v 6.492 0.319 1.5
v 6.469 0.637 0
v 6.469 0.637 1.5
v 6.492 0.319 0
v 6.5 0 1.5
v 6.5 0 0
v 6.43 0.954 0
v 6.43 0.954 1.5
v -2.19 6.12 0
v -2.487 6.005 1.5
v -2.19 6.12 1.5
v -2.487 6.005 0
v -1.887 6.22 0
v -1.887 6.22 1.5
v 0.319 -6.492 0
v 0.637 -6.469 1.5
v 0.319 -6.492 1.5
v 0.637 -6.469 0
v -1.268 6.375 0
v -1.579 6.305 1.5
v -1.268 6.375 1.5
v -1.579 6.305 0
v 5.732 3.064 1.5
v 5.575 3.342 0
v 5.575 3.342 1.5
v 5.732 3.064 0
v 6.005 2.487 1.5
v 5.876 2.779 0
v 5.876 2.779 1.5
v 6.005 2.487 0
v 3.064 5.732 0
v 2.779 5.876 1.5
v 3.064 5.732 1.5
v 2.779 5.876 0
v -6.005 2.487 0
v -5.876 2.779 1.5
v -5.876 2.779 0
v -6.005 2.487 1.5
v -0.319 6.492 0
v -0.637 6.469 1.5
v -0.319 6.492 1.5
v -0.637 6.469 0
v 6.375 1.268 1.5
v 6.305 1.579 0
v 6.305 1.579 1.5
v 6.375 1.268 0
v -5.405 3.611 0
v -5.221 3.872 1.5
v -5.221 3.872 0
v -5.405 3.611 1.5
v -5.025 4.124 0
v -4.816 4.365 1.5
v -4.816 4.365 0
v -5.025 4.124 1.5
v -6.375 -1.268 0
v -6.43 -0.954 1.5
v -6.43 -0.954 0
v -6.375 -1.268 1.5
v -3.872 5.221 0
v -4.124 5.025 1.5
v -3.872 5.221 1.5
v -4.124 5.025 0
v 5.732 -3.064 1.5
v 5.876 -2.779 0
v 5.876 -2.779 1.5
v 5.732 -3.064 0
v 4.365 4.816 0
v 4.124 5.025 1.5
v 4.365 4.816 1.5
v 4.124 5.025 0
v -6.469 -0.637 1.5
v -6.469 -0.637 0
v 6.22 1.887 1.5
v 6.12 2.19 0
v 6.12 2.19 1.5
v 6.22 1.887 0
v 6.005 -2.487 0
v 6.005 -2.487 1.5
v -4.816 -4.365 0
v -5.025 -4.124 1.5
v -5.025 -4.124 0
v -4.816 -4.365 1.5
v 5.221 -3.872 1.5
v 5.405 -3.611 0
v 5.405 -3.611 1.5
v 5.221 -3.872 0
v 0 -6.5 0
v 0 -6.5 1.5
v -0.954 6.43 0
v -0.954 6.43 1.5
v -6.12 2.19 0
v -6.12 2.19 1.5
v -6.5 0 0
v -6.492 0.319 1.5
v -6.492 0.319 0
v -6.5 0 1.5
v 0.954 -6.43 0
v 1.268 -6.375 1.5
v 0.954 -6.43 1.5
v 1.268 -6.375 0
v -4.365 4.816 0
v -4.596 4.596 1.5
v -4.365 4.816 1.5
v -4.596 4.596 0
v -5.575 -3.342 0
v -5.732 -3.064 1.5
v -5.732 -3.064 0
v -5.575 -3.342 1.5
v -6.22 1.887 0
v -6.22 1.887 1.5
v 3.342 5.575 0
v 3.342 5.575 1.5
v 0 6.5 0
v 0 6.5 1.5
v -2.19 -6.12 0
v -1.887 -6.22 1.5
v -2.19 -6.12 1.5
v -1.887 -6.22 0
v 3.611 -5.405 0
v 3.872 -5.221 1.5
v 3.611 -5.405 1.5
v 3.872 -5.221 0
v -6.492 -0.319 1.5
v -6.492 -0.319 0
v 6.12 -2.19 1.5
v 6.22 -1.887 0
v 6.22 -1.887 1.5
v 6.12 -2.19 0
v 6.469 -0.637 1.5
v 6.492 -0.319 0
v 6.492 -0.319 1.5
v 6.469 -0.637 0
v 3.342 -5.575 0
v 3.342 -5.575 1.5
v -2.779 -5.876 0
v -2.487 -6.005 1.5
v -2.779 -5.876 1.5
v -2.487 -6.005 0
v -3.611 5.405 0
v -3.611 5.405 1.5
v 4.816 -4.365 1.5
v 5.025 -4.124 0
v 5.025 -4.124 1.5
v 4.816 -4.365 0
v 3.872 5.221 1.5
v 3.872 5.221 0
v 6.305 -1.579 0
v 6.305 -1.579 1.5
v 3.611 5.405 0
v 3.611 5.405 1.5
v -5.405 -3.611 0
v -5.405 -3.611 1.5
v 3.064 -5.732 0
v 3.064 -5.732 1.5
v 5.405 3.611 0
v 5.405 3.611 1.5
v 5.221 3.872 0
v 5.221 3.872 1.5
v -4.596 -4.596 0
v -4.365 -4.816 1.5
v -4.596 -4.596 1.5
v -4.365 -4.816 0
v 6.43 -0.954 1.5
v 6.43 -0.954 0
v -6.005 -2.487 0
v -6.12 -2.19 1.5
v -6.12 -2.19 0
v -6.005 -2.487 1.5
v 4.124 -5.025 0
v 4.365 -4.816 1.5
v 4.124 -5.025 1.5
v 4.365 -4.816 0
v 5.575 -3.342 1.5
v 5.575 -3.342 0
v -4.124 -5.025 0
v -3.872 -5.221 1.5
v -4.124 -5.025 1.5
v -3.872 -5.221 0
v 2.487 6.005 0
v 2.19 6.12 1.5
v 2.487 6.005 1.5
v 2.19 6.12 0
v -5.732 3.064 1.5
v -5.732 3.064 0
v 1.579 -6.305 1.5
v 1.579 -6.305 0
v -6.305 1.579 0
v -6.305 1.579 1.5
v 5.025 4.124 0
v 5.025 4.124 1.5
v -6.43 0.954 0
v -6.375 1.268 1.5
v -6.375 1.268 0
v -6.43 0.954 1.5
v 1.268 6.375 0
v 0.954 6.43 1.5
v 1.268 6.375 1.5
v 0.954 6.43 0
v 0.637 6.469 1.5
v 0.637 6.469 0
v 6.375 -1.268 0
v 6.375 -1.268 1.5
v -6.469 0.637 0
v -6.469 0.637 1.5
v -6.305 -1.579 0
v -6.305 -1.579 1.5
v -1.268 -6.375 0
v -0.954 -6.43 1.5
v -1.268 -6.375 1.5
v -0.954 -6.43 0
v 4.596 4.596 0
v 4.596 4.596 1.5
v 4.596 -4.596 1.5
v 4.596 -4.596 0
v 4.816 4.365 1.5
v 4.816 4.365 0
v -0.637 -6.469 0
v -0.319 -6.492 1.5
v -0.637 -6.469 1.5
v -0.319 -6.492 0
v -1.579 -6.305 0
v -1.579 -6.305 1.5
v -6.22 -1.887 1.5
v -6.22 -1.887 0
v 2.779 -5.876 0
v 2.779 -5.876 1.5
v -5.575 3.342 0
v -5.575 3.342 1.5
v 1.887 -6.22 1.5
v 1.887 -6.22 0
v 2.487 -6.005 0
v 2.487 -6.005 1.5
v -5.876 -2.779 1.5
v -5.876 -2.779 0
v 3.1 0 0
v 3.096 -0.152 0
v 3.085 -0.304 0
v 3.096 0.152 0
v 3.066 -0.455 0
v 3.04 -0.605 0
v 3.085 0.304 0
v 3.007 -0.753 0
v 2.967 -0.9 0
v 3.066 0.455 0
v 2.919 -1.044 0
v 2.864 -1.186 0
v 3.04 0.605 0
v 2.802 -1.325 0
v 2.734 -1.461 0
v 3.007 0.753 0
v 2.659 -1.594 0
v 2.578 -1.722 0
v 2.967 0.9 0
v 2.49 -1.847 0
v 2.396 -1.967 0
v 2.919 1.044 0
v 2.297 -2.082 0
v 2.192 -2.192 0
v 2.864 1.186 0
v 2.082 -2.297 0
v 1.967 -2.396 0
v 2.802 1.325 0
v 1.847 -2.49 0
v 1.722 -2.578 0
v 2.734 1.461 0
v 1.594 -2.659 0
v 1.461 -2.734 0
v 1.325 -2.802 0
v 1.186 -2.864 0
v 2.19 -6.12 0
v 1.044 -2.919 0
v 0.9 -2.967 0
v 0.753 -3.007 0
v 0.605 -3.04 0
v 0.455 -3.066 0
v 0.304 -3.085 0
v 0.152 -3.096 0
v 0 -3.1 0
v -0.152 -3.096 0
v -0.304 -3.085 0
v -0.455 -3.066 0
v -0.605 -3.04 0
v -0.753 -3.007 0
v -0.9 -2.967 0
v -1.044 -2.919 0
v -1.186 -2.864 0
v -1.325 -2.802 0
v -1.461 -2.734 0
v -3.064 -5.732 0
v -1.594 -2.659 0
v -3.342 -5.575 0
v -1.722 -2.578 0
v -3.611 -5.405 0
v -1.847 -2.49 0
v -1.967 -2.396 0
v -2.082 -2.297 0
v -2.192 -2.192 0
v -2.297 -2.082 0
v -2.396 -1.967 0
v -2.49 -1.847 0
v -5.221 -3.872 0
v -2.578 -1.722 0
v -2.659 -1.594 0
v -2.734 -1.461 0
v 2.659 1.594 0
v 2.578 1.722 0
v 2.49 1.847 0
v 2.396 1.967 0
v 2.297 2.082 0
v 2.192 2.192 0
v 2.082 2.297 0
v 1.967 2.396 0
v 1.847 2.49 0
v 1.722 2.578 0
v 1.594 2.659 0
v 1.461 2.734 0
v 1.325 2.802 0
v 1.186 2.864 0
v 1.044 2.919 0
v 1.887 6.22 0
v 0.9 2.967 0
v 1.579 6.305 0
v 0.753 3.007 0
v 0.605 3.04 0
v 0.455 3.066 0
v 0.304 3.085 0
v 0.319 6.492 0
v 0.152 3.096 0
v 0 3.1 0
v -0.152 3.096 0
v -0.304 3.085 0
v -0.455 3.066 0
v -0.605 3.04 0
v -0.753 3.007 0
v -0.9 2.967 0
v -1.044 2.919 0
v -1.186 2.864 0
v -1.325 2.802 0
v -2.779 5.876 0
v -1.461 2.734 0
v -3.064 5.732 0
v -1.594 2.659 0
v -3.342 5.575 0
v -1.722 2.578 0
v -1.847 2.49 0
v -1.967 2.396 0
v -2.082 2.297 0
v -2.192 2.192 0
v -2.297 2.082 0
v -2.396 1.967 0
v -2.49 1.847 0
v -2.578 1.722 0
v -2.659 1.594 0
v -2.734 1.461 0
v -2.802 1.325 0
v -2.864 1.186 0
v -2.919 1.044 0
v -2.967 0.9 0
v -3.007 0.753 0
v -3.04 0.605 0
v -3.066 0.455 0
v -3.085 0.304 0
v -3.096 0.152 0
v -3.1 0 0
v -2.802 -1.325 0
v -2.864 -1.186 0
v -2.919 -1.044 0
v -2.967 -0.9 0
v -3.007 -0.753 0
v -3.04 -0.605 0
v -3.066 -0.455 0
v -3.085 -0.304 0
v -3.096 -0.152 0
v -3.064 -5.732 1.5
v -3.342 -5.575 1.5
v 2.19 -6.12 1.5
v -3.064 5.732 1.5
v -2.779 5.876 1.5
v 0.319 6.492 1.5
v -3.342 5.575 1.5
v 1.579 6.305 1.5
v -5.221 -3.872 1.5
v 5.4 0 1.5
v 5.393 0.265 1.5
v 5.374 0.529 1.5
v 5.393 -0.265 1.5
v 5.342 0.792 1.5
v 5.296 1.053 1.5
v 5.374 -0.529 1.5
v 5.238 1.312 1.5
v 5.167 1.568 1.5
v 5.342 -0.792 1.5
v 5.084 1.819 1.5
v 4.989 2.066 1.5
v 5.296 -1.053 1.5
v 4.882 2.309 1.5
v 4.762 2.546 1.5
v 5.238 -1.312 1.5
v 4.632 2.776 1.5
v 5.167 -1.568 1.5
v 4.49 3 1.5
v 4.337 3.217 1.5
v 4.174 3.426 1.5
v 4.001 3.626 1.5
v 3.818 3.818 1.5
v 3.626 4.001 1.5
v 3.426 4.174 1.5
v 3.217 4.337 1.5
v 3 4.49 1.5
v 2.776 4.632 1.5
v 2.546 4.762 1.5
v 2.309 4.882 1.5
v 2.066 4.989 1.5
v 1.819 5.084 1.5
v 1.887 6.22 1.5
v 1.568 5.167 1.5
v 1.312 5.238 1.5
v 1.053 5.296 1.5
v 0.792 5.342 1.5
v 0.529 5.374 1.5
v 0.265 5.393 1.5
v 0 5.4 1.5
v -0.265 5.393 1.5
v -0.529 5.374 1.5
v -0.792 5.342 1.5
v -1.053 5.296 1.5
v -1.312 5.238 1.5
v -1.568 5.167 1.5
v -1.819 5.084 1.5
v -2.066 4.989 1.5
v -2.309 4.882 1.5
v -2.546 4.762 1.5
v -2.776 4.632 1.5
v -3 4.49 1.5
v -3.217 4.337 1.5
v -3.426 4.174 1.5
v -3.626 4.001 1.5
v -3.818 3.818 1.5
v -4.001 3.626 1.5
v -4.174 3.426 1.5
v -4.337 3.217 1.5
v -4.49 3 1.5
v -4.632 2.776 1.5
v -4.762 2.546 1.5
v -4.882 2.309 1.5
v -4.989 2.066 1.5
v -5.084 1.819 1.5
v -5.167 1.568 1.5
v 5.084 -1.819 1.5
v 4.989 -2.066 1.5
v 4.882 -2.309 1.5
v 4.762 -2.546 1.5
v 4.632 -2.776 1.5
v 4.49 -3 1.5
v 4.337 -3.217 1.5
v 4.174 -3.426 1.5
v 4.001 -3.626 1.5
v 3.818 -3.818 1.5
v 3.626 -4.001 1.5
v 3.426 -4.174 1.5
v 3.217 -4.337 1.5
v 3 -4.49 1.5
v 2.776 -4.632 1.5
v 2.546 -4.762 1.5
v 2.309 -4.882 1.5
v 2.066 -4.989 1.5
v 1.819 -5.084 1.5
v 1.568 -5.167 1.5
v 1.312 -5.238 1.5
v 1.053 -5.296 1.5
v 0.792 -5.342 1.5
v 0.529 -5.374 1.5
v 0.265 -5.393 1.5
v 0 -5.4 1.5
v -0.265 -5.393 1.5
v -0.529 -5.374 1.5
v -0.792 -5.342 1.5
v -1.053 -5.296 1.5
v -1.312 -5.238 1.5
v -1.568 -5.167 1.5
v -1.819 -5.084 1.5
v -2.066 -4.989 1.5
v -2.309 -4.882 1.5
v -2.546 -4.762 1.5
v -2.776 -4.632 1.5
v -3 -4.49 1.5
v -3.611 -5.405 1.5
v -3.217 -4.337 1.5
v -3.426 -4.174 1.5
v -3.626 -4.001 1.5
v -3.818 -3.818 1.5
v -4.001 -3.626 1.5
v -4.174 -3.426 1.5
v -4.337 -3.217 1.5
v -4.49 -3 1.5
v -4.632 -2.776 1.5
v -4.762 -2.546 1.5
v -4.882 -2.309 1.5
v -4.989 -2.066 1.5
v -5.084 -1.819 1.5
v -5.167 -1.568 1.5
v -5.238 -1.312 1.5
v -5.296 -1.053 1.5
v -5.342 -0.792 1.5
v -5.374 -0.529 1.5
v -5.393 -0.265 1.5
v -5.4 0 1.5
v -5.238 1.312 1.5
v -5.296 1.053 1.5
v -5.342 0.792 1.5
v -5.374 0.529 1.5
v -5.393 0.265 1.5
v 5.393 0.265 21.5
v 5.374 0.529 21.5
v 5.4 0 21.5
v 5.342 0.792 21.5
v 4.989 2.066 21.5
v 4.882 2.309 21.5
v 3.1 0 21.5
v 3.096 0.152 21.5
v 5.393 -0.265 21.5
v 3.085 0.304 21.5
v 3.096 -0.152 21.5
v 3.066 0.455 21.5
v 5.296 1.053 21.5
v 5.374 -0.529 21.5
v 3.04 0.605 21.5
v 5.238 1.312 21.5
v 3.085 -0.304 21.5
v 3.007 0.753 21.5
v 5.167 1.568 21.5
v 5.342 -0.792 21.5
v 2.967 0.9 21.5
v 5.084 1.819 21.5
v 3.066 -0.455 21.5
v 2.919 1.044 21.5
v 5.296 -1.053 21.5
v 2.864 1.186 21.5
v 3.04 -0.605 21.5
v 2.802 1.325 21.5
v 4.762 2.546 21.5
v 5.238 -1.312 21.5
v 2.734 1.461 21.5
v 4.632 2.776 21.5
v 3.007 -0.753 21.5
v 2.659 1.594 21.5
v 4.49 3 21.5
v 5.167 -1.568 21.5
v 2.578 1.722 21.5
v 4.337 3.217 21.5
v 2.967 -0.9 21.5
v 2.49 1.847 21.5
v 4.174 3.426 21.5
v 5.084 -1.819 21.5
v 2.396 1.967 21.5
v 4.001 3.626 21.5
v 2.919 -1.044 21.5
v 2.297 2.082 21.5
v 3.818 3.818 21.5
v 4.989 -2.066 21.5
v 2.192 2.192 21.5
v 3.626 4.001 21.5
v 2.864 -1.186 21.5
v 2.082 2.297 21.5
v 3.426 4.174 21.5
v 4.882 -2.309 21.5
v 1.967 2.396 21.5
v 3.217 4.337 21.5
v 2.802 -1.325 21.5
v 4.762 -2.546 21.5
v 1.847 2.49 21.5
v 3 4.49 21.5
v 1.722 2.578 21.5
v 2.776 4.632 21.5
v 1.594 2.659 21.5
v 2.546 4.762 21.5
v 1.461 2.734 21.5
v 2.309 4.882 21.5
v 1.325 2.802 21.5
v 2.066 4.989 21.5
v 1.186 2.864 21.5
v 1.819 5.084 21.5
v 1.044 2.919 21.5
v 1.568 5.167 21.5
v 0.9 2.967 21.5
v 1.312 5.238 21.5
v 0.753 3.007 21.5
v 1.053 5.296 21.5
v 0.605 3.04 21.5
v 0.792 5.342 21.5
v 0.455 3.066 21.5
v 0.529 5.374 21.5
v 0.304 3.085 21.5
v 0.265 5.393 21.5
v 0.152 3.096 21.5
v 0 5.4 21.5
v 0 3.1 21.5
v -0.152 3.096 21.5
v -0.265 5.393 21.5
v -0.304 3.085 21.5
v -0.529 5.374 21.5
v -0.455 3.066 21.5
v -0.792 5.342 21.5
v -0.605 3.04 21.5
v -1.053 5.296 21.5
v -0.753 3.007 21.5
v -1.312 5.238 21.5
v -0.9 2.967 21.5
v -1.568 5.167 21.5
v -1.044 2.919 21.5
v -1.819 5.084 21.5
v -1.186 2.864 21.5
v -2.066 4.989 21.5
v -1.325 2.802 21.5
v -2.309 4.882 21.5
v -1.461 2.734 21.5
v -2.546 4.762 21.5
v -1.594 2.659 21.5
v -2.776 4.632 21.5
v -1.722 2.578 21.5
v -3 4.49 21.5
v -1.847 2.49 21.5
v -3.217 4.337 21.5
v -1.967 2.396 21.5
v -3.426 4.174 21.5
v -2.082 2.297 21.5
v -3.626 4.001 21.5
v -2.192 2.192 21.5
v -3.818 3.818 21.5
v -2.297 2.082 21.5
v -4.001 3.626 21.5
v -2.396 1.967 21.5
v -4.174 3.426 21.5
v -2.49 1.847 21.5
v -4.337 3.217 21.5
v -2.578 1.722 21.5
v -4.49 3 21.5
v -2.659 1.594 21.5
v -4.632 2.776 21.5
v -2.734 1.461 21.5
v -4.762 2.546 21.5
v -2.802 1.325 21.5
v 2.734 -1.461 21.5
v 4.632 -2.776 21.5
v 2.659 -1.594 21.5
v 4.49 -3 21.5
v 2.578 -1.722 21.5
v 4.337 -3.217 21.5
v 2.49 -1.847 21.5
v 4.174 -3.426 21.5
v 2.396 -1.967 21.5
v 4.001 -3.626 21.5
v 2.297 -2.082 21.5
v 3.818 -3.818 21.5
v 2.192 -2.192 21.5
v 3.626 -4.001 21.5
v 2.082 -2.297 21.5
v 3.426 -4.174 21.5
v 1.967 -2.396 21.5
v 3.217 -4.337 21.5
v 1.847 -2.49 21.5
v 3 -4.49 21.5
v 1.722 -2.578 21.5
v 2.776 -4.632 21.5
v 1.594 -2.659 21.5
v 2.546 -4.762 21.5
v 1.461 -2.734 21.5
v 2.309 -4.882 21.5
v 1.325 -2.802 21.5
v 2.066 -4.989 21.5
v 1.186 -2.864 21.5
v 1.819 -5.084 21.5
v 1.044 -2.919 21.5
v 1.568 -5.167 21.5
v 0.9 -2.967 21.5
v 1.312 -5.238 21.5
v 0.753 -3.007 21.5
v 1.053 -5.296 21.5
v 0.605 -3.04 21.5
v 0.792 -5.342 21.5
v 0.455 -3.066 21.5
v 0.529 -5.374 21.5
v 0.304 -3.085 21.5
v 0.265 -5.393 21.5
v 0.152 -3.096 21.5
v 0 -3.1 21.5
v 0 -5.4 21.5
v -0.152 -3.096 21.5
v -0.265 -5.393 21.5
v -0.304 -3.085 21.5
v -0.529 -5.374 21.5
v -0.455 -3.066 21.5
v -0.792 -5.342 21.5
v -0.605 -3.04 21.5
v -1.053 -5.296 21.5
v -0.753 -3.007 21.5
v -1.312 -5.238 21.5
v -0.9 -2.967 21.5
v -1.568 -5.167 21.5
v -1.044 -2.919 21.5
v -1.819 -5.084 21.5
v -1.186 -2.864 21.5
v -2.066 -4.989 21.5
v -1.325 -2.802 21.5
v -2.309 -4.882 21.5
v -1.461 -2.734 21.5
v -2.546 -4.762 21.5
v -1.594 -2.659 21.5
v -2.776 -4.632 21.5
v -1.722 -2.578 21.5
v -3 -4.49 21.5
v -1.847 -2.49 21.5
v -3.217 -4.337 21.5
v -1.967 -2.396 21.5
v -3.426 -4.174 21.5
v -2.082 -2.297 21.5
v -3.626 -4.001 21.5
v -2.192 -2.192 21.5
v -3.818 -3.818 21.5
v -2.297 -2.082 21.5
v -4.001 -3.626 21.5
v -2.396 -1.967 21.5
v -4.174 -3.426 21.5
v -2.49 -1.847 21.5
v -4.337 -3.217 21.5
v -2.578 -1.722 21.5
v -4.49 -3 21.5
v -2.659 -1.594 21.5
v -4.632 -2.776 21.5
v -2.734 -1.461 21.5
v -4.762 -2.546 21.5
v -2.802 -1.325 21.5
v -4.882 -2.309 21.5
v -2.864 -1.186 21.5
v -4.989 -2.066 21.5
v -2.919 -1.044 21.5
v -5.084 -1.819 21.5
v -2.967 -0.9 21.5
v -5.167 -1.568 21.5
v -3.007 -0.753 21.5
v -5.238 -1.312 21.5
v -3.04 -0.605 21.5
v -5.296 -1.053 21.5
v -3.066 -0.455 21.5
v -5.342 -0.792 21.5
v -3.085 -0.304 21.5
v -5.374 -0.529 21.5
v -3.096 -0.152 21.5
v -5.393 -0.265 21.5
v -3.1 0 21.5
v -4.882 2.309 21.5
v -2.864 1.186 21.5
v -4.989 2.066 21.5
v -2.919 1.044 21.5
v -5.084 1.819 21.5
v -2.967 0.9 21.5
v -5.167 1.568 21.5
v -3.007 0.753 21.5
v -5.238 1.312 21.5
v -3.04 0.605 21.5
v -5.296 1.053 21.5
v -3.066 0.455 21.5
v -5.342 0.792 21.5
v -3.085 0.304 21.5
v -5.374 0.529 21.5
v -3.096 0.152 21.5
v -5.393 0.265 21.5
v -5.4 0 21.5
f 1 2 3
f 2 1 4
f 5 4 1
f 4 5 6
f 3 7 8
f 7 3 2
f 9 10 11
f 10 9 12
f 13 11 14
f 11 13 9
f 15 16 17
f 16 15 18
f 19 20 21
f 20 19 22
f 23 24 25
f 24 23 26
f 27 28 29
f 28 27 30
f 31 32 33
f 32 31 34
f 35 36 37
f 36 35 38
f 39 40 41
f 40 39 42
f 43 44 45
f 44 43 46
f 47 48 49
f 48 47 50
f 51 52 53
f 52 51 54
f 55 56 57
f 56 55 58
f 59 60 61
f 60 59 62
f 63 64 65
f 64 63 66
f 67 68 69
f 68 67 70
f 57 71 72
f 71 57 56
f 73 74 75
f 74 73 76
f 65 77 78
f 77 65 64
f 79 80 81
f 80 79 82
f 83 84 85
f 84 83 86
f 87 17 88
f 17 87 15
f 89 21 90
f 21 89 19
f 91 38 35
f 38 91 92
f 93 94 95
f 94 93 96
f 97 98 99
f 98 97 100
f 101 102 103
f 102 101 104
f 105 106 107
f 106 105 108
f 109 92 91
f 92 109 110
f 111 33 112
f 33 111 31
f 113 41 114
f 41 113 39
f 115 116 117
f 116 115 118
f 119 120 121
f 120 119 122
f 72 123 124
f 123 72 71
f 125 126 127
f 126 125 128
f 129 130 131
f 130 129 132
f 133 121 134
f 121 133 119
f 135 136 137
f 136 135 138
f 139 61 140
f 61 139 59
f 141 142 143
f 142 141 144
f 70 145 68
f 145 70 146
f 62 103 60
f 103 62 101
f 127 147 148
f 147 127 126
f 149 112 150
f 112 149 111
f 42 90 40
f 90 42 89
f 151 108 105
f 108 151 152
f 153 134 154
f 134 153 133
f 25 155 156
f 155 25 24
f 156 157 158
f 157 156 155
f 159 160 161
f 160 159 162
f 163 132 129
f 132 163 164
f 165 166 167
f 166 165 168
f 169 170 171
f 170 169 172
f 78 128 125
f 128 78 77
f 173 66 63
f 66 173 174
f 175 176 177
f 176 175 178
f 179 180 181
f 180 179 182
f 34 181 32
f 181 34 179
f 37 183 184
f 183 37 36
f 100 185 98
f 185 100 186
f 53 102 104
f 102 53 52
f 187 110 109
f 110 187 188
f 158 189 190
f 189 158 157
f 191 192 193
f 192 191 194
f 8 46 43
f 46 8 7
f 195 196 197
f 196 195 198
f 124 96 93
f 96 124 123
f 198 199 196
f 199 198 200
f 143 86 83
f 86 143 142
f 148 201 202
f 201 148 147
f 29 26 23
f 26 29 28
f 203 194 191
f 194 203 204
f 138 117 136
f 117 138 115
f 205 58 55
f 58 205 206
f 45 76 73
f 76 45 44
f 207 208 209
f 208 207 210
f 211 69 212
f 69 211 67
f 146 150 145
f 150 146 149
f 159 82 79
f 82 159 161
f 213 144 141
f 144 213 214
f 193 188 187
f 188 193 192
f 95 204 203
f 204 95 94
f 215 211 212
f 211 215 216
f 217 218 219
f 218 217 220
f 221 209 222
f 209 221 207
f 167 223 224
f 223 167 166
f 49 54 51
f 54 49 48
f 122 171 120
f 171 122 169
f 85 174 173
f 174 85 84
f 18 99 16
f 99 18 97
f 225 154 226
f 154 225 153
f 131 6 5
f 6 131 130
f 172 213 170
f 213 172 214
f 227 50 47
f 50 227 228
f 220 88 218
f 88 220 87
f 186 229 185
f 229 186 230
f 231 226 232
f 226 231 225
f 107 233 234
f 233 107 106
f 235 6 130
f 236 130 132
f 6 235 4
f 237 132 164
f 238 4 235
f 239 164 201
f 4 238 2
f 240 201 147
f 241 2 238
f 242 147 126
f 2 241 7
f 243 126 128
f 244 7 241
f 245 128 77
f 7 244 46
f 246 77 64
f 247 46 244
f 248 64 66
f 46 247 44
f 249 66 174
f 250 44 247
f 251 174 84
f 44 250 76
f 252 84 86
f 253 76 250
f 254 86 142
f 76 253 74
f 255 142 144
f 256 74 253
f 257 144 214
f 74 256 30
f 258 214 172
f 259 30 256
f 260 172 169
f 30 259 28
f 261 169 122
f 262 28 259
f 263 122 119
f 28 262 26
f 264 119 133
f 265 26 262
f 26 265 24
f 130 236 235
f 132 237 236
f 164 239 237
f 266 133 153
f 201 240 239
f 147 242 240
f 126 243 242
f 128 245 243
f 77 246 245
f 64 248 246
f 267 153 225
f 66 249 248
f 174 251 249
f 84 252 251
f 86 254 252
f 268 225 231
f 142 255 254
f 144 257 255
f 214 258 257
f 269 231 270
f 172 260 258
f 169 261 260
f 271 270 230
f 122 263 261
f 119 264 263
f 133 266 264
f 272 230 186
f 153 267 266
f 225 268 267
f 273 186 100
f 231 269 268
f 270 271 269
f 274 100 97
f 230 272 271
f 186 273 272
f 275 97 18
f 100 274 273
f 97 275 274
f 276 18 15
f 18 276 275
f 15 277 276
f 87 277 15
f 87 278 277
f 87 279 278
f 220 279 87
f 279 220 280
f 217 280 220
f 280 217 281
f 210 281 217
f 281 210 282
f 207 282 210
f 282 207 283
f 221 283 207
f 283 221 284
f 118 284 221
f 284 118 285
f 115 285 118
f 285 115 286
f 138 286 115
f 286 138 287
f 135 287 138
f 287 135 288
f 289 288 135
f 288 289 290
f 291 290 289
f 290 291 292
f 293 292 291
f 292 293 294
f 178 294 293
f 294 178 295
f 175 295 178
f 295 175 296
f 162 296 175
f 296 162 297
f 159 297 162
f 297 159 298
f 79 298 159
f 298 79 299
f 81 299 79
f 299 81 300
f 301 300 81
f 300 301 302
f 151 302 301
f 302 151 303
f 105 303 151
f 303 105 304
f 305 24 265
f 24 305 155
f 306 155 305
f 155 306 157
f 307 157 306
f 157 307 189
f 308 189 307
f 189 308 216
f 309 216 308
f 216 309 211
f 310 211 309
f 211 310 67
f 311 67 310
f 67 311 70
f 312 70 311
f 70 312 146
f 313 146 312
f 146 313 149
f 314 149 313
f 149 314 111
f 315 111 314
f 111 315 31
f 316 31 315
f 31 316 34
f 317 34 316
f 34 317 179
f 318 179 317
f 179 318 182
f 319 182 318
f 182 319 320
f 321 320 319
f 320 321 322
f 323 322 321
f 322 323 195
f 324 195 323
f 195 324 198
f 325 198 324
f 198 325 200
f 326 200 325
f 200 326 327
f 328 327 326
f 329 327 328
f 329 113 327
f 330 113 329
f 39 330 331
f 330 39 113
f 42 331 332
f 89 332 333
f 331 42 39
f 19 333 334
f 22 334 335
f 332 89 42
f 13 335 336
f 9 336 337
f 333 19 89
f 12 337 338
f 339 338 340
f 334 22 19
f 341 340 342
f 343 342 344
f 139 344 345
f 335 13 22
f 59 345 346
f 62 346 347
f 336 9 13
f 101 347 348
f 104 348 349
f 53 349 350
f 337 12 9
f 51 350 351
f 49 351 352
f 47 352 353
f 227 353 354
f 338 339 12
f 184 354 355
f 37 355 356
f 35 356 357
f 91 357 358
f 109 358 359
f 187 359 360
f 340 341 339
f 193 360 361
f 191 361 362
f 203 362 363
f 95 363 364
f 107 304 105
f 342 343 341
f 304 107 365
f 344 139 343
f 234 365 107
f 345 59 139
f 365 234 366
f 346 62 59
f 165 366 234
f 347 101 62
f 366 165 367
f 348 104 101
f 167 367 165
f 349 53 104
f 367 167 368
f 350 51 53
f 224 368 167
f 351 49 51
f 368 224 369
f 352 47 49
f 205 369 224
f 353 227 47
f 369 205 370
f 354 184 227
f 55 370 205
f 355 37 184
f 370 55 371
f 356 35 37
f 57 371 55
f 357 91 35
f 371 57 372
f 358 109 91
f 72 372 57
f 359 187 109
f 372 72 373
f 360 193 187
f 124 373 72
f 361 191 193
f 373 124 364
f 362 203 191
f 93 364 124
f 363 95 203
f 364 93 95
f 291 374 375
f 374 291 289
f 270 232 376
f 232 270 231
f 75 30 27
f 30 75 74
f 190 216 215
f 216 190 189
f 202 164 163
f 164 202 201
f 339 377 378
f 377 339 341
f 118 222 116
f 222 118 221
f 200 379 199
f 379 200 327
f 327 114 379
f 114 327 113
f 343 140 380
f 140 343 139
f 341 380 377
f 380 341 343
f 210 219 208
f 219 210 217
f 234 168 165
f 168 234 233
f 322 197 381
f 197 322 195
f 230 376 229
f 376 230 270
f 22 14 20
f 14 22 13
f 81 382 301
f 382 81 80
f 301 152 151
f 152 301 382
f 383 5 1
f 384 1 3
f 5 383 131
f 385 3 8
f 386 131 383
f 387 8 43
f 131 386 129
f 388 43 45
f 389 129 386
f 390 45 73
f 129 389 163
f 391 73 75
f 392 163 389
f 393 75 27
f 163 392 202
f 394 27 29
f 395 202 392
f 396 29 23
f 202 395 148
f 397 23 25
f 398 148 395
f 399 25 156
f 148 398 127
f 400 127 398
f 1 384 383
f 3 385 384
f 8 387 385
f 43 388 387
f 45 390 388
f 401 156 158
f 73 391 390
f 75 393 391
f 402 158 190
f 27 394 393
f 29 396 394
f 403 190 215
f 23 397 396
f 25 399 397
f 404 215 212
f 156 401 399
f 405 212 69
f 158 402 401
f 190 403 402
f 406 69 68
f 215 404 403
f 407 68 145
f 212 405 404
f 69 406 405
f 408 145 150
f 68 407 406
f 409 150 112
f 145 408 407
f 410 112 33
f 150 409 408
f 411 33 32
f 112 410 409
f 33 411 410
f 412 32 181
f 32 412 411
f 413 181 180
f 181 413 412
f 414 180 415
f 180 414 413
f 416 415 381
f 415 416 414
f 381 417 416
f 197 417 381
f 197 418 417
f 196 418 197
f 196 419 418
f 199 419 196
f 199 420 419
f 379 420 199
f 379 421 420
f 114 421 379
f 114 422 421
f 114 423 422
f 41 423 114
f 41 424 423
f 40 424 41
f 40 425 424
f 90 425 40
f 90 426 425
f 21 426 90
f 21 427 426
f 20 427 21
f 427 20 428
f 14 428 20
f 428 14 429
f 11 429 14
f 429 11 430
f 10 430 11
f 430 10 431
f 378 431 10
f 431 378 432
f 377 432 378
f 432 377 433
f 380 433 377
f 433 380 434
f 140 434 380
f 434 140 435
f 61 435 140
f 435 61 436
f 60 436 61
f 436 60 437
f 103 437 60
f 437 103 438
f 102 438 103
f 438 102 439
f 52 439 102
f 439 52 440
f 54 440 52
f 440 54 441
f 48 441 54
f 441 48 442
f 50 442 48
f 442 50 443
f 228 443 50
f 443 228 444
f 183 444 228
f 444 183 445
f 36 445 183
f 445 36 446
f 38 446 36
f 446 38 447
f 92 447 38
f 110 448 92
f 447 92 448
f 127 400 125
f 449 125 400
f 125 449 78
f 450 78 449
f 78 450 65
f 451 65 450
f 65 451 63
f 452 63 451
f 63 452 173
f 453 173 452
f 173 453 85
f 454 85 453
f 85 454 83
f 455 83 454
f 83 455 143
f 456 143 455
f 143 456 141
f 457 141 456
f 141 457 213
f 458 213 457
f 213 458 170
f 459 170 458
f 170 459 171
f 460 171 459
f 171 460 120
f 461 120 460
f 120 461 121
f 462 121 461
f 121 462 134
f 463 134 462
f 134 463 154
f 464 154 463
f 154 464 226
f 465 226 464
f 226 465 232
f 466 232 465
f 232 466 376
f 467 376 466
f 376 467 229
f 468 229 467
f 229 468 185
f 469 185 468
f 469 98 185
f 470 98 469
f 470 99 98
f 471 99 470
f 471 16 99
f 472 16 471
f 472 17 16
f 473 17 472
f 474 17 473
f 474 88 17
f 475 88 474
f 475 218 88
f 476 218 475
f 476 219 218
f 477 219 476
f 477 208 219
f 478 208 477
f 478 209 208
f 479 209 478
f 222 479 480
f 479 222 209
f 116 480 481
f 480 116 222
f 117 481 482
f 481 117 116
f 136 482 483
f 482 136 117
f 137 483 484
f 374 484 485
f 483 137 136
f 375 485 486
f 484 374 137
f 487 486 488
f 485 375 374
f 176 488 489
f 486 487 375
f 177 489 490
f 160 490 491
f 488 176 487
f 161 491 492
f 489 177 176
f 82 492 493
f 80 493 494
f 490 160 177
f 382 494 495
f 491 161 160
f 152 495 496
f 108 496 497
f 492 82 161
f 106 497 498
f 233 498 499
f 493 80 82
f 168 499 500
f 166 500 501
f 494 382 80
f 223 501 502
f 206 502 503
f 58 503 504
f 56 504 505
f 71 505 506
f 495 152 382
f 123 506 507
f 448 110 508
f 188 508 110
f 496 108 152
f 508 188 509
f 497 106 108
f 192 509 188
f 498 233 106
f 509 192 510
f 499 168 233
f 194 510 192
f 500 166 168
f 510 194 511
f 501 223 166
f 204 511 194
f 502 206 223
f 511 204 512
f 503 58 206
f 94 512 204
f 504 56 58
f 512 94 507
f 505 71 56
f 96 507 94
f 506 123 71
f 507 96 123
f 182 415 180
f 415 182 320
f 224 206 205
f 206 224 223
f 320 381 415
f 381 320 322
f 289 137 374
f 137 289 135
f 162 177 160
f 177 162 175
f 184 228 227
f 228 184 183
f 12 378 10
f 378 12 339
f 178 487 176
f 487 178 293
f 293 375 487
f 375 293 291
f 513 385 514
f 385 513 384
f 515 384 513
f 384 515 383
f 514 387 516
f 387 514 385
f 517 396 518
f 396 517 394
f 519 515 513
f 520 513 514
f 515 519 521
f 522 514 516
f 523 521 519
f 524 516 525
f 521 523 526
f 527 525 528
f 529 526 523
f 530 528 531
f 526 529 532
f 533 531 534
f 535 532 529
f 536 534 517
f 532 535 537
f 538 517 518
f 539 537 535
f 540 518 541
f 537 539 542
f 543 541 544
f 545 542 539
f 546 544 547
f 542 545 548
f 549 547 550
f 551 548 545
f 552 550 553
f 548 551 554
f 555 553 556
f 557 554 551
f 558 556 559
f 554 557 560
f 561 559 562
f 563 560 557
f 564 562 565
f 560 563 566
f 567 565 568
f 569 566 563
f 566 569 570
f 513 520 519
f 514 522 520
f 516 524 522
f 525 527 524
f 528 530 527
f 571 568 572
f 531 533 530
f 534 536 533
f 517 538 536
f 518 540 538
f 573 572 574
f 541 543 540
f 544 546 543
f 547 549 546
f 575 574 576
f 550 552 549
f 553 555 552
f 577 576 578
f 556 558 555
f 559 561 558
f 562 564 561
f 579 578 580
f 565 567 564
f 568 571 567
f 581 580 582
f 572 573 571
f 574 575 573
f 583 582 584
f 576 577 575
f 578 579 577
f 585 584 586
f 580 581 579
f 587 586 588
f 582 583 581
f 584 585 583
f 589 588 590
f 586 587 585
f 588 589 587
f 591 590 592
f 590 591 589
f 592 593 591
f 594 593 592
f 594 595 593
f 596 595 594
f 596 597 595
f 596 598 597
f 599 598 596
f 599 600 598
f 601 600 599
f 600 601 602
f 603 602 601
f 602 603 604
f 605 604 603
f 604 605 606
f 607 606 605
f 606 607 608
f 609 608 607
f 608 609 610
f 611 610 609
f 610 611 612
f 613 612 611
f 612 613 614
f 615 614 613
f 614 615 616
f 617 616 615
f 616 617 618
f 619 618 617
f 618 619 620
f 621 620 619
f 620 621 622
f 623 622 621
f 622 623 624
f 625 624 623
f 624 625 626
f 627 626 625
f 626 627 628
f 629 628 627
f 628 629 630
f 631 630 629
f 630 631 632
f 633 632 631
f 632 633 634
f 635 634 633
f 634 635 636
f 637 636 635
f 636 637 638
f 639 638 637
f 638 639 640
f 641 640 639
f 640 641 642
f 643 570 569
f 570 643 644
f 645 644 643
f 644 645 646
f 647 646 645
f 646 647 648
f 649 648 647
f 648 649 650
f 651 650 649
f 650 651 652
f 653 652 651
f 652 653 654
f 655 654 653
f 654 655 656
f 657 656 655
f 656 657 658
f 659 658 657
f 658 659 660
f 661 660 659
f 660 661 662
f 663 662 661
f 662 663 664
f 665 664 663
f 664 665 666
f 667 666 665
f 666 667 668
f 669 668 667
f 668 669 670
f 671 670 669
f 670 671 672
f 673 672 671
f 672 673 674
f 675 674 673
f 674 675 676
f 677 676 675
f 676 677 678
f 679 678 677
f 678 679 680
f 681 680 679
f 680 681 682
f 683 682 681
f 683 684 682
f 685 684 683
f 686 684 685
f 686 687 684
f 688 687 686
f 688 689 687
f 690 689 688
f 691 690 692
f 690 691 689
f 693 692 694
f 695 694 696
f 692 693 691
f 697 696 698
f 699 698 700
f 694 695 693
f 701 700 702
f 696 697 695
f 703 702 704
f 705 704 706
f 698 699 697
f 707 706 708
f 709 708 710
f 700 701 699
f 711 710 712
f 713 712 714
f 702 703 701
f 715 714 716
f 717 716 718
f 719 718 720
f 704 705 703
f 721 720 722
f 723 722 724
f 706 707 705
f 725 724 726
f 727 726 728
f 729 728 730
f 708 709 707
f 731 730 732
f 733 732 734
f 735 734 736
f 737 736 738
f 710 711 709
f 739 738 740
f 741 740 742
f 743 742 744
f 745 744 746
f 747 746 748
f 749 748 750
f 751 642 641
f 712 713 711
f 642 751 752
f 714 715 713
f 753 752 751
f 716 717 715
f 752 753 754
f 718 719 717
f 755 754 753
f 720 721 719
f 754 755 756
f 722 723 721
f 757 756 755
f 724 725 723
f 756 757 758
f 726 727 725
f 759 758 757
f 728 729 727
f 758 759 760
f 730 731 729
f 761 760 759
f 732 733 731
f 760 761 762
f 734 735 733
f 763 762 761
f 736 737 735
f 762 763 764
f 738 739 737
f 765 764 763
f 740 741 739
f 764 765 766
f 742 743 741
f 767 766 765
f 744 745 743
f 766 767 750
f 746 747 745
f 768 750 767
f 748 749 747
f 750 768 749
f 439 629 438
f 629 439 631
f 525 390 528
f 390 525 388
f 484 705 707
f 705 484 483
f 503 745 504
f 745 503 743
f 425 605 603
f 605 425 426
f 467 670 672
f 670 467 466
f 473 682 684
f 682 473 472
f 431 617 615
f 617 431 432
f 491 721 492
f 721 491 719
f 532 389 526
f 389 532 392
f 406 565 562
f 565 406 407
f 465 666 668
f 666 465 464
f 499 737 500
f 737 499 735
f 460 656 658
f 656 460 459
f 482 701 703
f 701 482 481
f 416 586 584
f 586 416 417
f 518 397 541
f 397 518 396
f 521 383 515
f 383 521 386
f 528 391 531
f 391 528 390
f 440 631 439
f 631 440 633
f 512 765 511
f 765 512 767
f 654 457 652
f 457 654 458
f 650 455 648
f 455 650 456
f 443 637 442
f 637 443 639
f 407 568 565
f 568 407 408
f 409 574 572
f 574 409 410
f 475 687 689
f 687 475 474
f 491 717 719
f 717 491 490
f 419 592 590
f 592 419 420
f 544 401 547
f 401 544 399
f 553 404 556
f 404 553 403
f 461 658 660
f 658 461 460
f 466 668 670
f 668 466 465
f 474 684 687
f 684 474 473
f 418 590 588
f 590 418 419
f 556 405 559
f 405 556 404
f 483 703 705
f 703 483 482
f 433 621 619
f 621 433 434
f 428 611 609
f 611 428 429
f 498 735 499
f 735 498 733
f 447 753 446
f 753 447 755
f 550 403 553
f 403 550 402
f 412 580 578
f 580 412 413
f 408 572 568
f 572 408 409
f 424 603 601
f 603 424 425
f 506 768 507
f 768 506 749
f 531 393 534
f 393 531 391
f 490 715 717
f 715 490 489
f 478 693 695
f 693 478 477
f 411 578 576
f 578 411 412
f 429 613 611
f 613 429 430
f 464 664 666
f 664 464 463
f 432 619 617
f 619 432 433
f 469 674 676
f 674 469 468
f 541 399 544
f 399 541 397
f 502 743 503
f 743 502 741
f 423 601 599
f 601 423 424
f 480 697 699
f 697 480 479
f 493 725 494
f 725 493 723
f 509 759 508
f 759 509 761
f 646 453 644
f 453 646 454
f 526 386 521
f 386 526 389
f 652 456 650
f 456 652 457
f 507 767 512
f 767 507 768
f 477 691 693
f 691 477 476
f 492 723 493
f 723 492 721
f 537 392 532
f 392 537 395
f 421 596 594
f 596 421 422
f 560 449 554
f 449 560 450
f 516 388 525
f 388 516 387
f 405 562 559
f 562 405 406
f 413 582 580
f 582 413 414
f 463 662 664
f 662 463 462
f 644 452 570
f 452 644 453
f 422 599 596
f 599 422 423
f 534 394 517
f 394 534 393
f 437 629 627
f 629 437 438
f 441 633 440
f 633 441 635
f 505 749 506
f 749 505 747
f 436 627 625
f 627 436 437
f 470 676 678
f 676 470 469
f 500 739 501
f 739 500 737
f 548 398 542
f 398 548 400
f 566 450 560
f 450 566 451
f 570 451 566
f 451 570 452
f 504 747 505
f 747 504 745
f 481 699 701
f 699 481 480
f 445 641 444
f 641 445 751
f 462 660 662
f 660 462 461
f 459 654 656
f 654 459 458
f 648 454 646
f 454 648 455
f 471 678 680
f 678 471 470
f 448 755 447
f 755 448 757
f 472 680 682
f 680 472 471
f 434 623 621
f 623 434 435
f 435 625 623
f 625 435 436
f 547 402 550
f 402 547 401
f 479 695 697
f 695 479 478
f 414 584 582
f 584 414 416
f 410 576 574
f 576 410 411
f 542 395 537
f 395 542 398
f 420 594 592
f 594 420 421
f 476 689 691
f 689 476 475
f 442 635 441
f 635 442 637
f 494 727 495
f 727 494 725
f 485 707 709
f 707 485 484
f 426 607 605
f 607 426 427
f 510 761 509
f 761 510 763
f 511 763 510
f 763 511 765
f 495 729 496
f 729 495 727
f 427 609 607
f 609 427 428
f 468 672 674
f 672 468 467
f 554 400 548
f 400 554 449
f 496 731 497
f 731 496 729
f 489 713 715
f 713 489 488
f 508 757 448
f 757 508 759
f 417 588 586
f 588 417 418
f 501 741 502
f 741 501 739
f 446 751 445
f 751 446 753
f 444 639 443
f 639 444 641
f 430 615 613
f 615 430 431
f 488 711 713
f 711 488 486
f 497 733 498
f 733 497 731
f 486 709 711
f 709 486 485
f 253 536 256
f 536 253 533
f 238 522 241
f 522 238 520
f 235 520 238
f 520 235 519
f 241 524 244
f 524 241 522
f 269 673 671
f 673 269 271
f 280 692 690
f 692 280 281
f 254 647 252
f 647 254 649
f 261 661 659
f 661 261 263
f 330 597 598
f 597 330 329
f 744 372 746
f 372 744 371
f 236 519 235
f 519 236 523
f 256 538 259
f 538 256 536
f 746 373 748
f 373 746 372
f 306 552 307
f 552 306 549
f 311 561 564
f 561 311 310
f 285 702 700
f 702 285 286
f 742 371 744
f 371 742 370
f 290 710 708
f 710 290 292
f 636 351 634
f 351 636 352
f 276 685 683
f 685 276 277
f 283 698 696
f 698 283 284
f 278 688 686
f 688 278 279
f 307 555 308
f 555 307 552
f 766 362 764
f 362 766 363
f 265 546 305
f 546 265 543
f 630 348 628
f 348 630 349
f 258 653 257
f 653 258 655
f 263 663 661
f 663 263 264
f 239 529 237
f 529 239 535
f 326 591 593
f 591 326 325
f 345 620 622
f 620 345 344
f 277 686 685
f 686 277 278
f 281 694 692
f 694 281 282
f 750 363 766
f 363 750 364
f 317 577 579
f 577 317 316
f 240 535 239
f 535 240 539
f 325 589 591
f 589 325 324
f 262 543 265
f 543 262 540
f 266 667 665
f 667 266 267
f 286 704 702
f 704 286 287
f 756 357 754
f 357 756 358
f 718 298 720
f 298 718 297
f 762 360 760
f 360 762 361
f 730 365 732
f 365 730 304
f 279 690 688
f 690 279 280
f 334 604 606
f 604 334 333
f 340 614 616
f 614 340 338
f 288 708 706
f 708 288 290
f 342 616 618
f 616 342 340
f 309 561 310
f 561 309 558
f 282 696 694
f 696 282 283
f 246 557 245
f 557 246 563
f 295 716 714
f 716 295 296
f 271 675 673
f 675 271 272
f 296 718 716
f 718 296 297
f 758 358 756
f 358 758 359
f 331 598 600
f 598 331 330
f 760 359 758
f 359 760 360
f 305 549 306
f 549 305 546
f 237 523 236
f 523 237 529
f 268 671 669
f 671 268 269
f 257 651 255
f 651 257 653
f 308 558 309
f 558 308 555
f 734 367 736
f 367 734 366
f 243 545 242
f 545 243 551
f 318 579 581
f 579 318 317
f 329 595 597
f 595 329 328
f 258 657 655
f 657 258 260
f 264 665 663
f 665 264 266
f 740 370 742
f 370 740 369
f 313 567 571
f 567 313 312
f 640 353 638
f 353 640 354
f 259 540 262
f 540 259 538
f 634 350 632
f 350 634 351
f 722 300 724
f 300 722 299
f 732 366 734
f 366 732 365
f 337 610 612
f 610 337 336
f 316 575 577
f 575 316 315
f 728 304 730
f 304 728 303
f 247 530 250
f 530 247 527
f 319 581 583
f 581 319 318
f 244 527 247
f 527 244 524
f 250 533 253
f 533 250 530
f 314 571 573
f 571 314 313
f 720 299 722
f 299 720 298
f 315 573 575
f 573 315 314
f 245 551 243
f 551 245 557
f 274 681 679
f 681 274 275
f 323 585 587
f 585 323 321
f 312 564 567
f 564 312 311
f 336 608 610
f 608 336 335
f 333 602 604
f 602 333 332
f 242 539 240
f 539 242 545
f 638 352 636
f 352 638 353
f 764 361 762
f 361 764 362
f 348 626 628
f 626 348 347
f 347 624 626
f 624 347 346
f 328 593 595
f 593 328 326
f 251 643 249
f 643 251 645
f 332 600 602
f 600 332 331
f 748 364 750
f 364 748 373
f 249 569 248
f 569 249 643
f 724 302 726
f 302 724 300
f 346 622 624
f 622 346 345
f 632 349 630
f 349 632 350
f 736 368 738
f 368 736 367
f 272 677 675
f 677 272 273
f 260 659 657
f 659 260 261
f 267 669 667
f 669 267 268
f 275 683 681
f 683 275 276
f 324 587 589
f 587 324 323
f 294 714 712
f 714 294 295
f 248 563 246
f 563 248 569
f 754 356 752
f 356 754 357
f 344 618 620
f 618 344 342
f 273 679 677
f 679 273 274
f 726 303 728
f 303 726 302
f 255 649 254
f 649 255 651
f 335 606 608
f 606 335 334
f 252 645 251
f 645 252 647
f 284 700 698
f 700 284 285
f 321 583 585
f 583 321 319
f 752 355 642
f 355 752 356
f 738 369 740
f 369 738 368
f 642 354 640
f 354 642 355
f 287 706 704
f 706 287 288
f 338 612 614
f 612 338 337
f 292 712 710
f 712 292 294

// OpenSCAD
// Adapter Sleeve for 0.2 mL PCR tubes in 1.5 mL rack holes
// Print orientation: Upside down (Collar on bed, Sleeve rising)
// Units: mm

// --- Dimensions ---
$fn = 128; // High resolution for smooth cylinders

// Collar (Base)
$collar_diameter = 13.0;
$collar_thickness = 1.5;

// Sleeve Body
$sleeve_outer_diameter = 10.8;
$sleeve_total_height = 21.5;

// Bore
$bore_diameter = 6.2;

// --- Calculated Heights ---
// Total height is 21.5. Collar is 1.5 thick.
// Sleeve body rises from top of collar (z=1.5) to z=21.5.
$sleeve_body_height = $sleeve_total_height - $collar_thickness;

// --- Main Body Construction ---
// We build the solid by unioning the Collar and the Sleeve Body,
// then subtracting the bore.

difference() {
    union() {
        // 1. The Collar (Base)
        // Lies on XY plane, centered at origin.
        cylinder(
            h = $collar_thickness,
            d = $collar_diameter,
            center = [0, 0, $collar_thickness / 2]
        );

        // 2. The Sleeve Body
        // Starts at z = $collar_thickness, ends at z = $sleeve_total_height.
        translate([0, 0, $collar_thickness]) {
            cylinder(
                h = $sleeve_body_height,
                d = $sleeve_outer_diameter,
                center = [0, 0, $sleeve_body_height / 2]
            );
        }
    }

    // 3. The Bore (Hole)
    // Runs through the full height (0 to $sleeve_total_height).
    // Extend slightly past the top and bottom faces to ensure clean cut.
    translate([0, 0, -0.1]) {
        cylinder(
            h = $sleeve_total_height + 0.2,
            d = $bore_diameter,
            center = [0, 0, $sleeve_total_height / 2]
        );
    }
}
